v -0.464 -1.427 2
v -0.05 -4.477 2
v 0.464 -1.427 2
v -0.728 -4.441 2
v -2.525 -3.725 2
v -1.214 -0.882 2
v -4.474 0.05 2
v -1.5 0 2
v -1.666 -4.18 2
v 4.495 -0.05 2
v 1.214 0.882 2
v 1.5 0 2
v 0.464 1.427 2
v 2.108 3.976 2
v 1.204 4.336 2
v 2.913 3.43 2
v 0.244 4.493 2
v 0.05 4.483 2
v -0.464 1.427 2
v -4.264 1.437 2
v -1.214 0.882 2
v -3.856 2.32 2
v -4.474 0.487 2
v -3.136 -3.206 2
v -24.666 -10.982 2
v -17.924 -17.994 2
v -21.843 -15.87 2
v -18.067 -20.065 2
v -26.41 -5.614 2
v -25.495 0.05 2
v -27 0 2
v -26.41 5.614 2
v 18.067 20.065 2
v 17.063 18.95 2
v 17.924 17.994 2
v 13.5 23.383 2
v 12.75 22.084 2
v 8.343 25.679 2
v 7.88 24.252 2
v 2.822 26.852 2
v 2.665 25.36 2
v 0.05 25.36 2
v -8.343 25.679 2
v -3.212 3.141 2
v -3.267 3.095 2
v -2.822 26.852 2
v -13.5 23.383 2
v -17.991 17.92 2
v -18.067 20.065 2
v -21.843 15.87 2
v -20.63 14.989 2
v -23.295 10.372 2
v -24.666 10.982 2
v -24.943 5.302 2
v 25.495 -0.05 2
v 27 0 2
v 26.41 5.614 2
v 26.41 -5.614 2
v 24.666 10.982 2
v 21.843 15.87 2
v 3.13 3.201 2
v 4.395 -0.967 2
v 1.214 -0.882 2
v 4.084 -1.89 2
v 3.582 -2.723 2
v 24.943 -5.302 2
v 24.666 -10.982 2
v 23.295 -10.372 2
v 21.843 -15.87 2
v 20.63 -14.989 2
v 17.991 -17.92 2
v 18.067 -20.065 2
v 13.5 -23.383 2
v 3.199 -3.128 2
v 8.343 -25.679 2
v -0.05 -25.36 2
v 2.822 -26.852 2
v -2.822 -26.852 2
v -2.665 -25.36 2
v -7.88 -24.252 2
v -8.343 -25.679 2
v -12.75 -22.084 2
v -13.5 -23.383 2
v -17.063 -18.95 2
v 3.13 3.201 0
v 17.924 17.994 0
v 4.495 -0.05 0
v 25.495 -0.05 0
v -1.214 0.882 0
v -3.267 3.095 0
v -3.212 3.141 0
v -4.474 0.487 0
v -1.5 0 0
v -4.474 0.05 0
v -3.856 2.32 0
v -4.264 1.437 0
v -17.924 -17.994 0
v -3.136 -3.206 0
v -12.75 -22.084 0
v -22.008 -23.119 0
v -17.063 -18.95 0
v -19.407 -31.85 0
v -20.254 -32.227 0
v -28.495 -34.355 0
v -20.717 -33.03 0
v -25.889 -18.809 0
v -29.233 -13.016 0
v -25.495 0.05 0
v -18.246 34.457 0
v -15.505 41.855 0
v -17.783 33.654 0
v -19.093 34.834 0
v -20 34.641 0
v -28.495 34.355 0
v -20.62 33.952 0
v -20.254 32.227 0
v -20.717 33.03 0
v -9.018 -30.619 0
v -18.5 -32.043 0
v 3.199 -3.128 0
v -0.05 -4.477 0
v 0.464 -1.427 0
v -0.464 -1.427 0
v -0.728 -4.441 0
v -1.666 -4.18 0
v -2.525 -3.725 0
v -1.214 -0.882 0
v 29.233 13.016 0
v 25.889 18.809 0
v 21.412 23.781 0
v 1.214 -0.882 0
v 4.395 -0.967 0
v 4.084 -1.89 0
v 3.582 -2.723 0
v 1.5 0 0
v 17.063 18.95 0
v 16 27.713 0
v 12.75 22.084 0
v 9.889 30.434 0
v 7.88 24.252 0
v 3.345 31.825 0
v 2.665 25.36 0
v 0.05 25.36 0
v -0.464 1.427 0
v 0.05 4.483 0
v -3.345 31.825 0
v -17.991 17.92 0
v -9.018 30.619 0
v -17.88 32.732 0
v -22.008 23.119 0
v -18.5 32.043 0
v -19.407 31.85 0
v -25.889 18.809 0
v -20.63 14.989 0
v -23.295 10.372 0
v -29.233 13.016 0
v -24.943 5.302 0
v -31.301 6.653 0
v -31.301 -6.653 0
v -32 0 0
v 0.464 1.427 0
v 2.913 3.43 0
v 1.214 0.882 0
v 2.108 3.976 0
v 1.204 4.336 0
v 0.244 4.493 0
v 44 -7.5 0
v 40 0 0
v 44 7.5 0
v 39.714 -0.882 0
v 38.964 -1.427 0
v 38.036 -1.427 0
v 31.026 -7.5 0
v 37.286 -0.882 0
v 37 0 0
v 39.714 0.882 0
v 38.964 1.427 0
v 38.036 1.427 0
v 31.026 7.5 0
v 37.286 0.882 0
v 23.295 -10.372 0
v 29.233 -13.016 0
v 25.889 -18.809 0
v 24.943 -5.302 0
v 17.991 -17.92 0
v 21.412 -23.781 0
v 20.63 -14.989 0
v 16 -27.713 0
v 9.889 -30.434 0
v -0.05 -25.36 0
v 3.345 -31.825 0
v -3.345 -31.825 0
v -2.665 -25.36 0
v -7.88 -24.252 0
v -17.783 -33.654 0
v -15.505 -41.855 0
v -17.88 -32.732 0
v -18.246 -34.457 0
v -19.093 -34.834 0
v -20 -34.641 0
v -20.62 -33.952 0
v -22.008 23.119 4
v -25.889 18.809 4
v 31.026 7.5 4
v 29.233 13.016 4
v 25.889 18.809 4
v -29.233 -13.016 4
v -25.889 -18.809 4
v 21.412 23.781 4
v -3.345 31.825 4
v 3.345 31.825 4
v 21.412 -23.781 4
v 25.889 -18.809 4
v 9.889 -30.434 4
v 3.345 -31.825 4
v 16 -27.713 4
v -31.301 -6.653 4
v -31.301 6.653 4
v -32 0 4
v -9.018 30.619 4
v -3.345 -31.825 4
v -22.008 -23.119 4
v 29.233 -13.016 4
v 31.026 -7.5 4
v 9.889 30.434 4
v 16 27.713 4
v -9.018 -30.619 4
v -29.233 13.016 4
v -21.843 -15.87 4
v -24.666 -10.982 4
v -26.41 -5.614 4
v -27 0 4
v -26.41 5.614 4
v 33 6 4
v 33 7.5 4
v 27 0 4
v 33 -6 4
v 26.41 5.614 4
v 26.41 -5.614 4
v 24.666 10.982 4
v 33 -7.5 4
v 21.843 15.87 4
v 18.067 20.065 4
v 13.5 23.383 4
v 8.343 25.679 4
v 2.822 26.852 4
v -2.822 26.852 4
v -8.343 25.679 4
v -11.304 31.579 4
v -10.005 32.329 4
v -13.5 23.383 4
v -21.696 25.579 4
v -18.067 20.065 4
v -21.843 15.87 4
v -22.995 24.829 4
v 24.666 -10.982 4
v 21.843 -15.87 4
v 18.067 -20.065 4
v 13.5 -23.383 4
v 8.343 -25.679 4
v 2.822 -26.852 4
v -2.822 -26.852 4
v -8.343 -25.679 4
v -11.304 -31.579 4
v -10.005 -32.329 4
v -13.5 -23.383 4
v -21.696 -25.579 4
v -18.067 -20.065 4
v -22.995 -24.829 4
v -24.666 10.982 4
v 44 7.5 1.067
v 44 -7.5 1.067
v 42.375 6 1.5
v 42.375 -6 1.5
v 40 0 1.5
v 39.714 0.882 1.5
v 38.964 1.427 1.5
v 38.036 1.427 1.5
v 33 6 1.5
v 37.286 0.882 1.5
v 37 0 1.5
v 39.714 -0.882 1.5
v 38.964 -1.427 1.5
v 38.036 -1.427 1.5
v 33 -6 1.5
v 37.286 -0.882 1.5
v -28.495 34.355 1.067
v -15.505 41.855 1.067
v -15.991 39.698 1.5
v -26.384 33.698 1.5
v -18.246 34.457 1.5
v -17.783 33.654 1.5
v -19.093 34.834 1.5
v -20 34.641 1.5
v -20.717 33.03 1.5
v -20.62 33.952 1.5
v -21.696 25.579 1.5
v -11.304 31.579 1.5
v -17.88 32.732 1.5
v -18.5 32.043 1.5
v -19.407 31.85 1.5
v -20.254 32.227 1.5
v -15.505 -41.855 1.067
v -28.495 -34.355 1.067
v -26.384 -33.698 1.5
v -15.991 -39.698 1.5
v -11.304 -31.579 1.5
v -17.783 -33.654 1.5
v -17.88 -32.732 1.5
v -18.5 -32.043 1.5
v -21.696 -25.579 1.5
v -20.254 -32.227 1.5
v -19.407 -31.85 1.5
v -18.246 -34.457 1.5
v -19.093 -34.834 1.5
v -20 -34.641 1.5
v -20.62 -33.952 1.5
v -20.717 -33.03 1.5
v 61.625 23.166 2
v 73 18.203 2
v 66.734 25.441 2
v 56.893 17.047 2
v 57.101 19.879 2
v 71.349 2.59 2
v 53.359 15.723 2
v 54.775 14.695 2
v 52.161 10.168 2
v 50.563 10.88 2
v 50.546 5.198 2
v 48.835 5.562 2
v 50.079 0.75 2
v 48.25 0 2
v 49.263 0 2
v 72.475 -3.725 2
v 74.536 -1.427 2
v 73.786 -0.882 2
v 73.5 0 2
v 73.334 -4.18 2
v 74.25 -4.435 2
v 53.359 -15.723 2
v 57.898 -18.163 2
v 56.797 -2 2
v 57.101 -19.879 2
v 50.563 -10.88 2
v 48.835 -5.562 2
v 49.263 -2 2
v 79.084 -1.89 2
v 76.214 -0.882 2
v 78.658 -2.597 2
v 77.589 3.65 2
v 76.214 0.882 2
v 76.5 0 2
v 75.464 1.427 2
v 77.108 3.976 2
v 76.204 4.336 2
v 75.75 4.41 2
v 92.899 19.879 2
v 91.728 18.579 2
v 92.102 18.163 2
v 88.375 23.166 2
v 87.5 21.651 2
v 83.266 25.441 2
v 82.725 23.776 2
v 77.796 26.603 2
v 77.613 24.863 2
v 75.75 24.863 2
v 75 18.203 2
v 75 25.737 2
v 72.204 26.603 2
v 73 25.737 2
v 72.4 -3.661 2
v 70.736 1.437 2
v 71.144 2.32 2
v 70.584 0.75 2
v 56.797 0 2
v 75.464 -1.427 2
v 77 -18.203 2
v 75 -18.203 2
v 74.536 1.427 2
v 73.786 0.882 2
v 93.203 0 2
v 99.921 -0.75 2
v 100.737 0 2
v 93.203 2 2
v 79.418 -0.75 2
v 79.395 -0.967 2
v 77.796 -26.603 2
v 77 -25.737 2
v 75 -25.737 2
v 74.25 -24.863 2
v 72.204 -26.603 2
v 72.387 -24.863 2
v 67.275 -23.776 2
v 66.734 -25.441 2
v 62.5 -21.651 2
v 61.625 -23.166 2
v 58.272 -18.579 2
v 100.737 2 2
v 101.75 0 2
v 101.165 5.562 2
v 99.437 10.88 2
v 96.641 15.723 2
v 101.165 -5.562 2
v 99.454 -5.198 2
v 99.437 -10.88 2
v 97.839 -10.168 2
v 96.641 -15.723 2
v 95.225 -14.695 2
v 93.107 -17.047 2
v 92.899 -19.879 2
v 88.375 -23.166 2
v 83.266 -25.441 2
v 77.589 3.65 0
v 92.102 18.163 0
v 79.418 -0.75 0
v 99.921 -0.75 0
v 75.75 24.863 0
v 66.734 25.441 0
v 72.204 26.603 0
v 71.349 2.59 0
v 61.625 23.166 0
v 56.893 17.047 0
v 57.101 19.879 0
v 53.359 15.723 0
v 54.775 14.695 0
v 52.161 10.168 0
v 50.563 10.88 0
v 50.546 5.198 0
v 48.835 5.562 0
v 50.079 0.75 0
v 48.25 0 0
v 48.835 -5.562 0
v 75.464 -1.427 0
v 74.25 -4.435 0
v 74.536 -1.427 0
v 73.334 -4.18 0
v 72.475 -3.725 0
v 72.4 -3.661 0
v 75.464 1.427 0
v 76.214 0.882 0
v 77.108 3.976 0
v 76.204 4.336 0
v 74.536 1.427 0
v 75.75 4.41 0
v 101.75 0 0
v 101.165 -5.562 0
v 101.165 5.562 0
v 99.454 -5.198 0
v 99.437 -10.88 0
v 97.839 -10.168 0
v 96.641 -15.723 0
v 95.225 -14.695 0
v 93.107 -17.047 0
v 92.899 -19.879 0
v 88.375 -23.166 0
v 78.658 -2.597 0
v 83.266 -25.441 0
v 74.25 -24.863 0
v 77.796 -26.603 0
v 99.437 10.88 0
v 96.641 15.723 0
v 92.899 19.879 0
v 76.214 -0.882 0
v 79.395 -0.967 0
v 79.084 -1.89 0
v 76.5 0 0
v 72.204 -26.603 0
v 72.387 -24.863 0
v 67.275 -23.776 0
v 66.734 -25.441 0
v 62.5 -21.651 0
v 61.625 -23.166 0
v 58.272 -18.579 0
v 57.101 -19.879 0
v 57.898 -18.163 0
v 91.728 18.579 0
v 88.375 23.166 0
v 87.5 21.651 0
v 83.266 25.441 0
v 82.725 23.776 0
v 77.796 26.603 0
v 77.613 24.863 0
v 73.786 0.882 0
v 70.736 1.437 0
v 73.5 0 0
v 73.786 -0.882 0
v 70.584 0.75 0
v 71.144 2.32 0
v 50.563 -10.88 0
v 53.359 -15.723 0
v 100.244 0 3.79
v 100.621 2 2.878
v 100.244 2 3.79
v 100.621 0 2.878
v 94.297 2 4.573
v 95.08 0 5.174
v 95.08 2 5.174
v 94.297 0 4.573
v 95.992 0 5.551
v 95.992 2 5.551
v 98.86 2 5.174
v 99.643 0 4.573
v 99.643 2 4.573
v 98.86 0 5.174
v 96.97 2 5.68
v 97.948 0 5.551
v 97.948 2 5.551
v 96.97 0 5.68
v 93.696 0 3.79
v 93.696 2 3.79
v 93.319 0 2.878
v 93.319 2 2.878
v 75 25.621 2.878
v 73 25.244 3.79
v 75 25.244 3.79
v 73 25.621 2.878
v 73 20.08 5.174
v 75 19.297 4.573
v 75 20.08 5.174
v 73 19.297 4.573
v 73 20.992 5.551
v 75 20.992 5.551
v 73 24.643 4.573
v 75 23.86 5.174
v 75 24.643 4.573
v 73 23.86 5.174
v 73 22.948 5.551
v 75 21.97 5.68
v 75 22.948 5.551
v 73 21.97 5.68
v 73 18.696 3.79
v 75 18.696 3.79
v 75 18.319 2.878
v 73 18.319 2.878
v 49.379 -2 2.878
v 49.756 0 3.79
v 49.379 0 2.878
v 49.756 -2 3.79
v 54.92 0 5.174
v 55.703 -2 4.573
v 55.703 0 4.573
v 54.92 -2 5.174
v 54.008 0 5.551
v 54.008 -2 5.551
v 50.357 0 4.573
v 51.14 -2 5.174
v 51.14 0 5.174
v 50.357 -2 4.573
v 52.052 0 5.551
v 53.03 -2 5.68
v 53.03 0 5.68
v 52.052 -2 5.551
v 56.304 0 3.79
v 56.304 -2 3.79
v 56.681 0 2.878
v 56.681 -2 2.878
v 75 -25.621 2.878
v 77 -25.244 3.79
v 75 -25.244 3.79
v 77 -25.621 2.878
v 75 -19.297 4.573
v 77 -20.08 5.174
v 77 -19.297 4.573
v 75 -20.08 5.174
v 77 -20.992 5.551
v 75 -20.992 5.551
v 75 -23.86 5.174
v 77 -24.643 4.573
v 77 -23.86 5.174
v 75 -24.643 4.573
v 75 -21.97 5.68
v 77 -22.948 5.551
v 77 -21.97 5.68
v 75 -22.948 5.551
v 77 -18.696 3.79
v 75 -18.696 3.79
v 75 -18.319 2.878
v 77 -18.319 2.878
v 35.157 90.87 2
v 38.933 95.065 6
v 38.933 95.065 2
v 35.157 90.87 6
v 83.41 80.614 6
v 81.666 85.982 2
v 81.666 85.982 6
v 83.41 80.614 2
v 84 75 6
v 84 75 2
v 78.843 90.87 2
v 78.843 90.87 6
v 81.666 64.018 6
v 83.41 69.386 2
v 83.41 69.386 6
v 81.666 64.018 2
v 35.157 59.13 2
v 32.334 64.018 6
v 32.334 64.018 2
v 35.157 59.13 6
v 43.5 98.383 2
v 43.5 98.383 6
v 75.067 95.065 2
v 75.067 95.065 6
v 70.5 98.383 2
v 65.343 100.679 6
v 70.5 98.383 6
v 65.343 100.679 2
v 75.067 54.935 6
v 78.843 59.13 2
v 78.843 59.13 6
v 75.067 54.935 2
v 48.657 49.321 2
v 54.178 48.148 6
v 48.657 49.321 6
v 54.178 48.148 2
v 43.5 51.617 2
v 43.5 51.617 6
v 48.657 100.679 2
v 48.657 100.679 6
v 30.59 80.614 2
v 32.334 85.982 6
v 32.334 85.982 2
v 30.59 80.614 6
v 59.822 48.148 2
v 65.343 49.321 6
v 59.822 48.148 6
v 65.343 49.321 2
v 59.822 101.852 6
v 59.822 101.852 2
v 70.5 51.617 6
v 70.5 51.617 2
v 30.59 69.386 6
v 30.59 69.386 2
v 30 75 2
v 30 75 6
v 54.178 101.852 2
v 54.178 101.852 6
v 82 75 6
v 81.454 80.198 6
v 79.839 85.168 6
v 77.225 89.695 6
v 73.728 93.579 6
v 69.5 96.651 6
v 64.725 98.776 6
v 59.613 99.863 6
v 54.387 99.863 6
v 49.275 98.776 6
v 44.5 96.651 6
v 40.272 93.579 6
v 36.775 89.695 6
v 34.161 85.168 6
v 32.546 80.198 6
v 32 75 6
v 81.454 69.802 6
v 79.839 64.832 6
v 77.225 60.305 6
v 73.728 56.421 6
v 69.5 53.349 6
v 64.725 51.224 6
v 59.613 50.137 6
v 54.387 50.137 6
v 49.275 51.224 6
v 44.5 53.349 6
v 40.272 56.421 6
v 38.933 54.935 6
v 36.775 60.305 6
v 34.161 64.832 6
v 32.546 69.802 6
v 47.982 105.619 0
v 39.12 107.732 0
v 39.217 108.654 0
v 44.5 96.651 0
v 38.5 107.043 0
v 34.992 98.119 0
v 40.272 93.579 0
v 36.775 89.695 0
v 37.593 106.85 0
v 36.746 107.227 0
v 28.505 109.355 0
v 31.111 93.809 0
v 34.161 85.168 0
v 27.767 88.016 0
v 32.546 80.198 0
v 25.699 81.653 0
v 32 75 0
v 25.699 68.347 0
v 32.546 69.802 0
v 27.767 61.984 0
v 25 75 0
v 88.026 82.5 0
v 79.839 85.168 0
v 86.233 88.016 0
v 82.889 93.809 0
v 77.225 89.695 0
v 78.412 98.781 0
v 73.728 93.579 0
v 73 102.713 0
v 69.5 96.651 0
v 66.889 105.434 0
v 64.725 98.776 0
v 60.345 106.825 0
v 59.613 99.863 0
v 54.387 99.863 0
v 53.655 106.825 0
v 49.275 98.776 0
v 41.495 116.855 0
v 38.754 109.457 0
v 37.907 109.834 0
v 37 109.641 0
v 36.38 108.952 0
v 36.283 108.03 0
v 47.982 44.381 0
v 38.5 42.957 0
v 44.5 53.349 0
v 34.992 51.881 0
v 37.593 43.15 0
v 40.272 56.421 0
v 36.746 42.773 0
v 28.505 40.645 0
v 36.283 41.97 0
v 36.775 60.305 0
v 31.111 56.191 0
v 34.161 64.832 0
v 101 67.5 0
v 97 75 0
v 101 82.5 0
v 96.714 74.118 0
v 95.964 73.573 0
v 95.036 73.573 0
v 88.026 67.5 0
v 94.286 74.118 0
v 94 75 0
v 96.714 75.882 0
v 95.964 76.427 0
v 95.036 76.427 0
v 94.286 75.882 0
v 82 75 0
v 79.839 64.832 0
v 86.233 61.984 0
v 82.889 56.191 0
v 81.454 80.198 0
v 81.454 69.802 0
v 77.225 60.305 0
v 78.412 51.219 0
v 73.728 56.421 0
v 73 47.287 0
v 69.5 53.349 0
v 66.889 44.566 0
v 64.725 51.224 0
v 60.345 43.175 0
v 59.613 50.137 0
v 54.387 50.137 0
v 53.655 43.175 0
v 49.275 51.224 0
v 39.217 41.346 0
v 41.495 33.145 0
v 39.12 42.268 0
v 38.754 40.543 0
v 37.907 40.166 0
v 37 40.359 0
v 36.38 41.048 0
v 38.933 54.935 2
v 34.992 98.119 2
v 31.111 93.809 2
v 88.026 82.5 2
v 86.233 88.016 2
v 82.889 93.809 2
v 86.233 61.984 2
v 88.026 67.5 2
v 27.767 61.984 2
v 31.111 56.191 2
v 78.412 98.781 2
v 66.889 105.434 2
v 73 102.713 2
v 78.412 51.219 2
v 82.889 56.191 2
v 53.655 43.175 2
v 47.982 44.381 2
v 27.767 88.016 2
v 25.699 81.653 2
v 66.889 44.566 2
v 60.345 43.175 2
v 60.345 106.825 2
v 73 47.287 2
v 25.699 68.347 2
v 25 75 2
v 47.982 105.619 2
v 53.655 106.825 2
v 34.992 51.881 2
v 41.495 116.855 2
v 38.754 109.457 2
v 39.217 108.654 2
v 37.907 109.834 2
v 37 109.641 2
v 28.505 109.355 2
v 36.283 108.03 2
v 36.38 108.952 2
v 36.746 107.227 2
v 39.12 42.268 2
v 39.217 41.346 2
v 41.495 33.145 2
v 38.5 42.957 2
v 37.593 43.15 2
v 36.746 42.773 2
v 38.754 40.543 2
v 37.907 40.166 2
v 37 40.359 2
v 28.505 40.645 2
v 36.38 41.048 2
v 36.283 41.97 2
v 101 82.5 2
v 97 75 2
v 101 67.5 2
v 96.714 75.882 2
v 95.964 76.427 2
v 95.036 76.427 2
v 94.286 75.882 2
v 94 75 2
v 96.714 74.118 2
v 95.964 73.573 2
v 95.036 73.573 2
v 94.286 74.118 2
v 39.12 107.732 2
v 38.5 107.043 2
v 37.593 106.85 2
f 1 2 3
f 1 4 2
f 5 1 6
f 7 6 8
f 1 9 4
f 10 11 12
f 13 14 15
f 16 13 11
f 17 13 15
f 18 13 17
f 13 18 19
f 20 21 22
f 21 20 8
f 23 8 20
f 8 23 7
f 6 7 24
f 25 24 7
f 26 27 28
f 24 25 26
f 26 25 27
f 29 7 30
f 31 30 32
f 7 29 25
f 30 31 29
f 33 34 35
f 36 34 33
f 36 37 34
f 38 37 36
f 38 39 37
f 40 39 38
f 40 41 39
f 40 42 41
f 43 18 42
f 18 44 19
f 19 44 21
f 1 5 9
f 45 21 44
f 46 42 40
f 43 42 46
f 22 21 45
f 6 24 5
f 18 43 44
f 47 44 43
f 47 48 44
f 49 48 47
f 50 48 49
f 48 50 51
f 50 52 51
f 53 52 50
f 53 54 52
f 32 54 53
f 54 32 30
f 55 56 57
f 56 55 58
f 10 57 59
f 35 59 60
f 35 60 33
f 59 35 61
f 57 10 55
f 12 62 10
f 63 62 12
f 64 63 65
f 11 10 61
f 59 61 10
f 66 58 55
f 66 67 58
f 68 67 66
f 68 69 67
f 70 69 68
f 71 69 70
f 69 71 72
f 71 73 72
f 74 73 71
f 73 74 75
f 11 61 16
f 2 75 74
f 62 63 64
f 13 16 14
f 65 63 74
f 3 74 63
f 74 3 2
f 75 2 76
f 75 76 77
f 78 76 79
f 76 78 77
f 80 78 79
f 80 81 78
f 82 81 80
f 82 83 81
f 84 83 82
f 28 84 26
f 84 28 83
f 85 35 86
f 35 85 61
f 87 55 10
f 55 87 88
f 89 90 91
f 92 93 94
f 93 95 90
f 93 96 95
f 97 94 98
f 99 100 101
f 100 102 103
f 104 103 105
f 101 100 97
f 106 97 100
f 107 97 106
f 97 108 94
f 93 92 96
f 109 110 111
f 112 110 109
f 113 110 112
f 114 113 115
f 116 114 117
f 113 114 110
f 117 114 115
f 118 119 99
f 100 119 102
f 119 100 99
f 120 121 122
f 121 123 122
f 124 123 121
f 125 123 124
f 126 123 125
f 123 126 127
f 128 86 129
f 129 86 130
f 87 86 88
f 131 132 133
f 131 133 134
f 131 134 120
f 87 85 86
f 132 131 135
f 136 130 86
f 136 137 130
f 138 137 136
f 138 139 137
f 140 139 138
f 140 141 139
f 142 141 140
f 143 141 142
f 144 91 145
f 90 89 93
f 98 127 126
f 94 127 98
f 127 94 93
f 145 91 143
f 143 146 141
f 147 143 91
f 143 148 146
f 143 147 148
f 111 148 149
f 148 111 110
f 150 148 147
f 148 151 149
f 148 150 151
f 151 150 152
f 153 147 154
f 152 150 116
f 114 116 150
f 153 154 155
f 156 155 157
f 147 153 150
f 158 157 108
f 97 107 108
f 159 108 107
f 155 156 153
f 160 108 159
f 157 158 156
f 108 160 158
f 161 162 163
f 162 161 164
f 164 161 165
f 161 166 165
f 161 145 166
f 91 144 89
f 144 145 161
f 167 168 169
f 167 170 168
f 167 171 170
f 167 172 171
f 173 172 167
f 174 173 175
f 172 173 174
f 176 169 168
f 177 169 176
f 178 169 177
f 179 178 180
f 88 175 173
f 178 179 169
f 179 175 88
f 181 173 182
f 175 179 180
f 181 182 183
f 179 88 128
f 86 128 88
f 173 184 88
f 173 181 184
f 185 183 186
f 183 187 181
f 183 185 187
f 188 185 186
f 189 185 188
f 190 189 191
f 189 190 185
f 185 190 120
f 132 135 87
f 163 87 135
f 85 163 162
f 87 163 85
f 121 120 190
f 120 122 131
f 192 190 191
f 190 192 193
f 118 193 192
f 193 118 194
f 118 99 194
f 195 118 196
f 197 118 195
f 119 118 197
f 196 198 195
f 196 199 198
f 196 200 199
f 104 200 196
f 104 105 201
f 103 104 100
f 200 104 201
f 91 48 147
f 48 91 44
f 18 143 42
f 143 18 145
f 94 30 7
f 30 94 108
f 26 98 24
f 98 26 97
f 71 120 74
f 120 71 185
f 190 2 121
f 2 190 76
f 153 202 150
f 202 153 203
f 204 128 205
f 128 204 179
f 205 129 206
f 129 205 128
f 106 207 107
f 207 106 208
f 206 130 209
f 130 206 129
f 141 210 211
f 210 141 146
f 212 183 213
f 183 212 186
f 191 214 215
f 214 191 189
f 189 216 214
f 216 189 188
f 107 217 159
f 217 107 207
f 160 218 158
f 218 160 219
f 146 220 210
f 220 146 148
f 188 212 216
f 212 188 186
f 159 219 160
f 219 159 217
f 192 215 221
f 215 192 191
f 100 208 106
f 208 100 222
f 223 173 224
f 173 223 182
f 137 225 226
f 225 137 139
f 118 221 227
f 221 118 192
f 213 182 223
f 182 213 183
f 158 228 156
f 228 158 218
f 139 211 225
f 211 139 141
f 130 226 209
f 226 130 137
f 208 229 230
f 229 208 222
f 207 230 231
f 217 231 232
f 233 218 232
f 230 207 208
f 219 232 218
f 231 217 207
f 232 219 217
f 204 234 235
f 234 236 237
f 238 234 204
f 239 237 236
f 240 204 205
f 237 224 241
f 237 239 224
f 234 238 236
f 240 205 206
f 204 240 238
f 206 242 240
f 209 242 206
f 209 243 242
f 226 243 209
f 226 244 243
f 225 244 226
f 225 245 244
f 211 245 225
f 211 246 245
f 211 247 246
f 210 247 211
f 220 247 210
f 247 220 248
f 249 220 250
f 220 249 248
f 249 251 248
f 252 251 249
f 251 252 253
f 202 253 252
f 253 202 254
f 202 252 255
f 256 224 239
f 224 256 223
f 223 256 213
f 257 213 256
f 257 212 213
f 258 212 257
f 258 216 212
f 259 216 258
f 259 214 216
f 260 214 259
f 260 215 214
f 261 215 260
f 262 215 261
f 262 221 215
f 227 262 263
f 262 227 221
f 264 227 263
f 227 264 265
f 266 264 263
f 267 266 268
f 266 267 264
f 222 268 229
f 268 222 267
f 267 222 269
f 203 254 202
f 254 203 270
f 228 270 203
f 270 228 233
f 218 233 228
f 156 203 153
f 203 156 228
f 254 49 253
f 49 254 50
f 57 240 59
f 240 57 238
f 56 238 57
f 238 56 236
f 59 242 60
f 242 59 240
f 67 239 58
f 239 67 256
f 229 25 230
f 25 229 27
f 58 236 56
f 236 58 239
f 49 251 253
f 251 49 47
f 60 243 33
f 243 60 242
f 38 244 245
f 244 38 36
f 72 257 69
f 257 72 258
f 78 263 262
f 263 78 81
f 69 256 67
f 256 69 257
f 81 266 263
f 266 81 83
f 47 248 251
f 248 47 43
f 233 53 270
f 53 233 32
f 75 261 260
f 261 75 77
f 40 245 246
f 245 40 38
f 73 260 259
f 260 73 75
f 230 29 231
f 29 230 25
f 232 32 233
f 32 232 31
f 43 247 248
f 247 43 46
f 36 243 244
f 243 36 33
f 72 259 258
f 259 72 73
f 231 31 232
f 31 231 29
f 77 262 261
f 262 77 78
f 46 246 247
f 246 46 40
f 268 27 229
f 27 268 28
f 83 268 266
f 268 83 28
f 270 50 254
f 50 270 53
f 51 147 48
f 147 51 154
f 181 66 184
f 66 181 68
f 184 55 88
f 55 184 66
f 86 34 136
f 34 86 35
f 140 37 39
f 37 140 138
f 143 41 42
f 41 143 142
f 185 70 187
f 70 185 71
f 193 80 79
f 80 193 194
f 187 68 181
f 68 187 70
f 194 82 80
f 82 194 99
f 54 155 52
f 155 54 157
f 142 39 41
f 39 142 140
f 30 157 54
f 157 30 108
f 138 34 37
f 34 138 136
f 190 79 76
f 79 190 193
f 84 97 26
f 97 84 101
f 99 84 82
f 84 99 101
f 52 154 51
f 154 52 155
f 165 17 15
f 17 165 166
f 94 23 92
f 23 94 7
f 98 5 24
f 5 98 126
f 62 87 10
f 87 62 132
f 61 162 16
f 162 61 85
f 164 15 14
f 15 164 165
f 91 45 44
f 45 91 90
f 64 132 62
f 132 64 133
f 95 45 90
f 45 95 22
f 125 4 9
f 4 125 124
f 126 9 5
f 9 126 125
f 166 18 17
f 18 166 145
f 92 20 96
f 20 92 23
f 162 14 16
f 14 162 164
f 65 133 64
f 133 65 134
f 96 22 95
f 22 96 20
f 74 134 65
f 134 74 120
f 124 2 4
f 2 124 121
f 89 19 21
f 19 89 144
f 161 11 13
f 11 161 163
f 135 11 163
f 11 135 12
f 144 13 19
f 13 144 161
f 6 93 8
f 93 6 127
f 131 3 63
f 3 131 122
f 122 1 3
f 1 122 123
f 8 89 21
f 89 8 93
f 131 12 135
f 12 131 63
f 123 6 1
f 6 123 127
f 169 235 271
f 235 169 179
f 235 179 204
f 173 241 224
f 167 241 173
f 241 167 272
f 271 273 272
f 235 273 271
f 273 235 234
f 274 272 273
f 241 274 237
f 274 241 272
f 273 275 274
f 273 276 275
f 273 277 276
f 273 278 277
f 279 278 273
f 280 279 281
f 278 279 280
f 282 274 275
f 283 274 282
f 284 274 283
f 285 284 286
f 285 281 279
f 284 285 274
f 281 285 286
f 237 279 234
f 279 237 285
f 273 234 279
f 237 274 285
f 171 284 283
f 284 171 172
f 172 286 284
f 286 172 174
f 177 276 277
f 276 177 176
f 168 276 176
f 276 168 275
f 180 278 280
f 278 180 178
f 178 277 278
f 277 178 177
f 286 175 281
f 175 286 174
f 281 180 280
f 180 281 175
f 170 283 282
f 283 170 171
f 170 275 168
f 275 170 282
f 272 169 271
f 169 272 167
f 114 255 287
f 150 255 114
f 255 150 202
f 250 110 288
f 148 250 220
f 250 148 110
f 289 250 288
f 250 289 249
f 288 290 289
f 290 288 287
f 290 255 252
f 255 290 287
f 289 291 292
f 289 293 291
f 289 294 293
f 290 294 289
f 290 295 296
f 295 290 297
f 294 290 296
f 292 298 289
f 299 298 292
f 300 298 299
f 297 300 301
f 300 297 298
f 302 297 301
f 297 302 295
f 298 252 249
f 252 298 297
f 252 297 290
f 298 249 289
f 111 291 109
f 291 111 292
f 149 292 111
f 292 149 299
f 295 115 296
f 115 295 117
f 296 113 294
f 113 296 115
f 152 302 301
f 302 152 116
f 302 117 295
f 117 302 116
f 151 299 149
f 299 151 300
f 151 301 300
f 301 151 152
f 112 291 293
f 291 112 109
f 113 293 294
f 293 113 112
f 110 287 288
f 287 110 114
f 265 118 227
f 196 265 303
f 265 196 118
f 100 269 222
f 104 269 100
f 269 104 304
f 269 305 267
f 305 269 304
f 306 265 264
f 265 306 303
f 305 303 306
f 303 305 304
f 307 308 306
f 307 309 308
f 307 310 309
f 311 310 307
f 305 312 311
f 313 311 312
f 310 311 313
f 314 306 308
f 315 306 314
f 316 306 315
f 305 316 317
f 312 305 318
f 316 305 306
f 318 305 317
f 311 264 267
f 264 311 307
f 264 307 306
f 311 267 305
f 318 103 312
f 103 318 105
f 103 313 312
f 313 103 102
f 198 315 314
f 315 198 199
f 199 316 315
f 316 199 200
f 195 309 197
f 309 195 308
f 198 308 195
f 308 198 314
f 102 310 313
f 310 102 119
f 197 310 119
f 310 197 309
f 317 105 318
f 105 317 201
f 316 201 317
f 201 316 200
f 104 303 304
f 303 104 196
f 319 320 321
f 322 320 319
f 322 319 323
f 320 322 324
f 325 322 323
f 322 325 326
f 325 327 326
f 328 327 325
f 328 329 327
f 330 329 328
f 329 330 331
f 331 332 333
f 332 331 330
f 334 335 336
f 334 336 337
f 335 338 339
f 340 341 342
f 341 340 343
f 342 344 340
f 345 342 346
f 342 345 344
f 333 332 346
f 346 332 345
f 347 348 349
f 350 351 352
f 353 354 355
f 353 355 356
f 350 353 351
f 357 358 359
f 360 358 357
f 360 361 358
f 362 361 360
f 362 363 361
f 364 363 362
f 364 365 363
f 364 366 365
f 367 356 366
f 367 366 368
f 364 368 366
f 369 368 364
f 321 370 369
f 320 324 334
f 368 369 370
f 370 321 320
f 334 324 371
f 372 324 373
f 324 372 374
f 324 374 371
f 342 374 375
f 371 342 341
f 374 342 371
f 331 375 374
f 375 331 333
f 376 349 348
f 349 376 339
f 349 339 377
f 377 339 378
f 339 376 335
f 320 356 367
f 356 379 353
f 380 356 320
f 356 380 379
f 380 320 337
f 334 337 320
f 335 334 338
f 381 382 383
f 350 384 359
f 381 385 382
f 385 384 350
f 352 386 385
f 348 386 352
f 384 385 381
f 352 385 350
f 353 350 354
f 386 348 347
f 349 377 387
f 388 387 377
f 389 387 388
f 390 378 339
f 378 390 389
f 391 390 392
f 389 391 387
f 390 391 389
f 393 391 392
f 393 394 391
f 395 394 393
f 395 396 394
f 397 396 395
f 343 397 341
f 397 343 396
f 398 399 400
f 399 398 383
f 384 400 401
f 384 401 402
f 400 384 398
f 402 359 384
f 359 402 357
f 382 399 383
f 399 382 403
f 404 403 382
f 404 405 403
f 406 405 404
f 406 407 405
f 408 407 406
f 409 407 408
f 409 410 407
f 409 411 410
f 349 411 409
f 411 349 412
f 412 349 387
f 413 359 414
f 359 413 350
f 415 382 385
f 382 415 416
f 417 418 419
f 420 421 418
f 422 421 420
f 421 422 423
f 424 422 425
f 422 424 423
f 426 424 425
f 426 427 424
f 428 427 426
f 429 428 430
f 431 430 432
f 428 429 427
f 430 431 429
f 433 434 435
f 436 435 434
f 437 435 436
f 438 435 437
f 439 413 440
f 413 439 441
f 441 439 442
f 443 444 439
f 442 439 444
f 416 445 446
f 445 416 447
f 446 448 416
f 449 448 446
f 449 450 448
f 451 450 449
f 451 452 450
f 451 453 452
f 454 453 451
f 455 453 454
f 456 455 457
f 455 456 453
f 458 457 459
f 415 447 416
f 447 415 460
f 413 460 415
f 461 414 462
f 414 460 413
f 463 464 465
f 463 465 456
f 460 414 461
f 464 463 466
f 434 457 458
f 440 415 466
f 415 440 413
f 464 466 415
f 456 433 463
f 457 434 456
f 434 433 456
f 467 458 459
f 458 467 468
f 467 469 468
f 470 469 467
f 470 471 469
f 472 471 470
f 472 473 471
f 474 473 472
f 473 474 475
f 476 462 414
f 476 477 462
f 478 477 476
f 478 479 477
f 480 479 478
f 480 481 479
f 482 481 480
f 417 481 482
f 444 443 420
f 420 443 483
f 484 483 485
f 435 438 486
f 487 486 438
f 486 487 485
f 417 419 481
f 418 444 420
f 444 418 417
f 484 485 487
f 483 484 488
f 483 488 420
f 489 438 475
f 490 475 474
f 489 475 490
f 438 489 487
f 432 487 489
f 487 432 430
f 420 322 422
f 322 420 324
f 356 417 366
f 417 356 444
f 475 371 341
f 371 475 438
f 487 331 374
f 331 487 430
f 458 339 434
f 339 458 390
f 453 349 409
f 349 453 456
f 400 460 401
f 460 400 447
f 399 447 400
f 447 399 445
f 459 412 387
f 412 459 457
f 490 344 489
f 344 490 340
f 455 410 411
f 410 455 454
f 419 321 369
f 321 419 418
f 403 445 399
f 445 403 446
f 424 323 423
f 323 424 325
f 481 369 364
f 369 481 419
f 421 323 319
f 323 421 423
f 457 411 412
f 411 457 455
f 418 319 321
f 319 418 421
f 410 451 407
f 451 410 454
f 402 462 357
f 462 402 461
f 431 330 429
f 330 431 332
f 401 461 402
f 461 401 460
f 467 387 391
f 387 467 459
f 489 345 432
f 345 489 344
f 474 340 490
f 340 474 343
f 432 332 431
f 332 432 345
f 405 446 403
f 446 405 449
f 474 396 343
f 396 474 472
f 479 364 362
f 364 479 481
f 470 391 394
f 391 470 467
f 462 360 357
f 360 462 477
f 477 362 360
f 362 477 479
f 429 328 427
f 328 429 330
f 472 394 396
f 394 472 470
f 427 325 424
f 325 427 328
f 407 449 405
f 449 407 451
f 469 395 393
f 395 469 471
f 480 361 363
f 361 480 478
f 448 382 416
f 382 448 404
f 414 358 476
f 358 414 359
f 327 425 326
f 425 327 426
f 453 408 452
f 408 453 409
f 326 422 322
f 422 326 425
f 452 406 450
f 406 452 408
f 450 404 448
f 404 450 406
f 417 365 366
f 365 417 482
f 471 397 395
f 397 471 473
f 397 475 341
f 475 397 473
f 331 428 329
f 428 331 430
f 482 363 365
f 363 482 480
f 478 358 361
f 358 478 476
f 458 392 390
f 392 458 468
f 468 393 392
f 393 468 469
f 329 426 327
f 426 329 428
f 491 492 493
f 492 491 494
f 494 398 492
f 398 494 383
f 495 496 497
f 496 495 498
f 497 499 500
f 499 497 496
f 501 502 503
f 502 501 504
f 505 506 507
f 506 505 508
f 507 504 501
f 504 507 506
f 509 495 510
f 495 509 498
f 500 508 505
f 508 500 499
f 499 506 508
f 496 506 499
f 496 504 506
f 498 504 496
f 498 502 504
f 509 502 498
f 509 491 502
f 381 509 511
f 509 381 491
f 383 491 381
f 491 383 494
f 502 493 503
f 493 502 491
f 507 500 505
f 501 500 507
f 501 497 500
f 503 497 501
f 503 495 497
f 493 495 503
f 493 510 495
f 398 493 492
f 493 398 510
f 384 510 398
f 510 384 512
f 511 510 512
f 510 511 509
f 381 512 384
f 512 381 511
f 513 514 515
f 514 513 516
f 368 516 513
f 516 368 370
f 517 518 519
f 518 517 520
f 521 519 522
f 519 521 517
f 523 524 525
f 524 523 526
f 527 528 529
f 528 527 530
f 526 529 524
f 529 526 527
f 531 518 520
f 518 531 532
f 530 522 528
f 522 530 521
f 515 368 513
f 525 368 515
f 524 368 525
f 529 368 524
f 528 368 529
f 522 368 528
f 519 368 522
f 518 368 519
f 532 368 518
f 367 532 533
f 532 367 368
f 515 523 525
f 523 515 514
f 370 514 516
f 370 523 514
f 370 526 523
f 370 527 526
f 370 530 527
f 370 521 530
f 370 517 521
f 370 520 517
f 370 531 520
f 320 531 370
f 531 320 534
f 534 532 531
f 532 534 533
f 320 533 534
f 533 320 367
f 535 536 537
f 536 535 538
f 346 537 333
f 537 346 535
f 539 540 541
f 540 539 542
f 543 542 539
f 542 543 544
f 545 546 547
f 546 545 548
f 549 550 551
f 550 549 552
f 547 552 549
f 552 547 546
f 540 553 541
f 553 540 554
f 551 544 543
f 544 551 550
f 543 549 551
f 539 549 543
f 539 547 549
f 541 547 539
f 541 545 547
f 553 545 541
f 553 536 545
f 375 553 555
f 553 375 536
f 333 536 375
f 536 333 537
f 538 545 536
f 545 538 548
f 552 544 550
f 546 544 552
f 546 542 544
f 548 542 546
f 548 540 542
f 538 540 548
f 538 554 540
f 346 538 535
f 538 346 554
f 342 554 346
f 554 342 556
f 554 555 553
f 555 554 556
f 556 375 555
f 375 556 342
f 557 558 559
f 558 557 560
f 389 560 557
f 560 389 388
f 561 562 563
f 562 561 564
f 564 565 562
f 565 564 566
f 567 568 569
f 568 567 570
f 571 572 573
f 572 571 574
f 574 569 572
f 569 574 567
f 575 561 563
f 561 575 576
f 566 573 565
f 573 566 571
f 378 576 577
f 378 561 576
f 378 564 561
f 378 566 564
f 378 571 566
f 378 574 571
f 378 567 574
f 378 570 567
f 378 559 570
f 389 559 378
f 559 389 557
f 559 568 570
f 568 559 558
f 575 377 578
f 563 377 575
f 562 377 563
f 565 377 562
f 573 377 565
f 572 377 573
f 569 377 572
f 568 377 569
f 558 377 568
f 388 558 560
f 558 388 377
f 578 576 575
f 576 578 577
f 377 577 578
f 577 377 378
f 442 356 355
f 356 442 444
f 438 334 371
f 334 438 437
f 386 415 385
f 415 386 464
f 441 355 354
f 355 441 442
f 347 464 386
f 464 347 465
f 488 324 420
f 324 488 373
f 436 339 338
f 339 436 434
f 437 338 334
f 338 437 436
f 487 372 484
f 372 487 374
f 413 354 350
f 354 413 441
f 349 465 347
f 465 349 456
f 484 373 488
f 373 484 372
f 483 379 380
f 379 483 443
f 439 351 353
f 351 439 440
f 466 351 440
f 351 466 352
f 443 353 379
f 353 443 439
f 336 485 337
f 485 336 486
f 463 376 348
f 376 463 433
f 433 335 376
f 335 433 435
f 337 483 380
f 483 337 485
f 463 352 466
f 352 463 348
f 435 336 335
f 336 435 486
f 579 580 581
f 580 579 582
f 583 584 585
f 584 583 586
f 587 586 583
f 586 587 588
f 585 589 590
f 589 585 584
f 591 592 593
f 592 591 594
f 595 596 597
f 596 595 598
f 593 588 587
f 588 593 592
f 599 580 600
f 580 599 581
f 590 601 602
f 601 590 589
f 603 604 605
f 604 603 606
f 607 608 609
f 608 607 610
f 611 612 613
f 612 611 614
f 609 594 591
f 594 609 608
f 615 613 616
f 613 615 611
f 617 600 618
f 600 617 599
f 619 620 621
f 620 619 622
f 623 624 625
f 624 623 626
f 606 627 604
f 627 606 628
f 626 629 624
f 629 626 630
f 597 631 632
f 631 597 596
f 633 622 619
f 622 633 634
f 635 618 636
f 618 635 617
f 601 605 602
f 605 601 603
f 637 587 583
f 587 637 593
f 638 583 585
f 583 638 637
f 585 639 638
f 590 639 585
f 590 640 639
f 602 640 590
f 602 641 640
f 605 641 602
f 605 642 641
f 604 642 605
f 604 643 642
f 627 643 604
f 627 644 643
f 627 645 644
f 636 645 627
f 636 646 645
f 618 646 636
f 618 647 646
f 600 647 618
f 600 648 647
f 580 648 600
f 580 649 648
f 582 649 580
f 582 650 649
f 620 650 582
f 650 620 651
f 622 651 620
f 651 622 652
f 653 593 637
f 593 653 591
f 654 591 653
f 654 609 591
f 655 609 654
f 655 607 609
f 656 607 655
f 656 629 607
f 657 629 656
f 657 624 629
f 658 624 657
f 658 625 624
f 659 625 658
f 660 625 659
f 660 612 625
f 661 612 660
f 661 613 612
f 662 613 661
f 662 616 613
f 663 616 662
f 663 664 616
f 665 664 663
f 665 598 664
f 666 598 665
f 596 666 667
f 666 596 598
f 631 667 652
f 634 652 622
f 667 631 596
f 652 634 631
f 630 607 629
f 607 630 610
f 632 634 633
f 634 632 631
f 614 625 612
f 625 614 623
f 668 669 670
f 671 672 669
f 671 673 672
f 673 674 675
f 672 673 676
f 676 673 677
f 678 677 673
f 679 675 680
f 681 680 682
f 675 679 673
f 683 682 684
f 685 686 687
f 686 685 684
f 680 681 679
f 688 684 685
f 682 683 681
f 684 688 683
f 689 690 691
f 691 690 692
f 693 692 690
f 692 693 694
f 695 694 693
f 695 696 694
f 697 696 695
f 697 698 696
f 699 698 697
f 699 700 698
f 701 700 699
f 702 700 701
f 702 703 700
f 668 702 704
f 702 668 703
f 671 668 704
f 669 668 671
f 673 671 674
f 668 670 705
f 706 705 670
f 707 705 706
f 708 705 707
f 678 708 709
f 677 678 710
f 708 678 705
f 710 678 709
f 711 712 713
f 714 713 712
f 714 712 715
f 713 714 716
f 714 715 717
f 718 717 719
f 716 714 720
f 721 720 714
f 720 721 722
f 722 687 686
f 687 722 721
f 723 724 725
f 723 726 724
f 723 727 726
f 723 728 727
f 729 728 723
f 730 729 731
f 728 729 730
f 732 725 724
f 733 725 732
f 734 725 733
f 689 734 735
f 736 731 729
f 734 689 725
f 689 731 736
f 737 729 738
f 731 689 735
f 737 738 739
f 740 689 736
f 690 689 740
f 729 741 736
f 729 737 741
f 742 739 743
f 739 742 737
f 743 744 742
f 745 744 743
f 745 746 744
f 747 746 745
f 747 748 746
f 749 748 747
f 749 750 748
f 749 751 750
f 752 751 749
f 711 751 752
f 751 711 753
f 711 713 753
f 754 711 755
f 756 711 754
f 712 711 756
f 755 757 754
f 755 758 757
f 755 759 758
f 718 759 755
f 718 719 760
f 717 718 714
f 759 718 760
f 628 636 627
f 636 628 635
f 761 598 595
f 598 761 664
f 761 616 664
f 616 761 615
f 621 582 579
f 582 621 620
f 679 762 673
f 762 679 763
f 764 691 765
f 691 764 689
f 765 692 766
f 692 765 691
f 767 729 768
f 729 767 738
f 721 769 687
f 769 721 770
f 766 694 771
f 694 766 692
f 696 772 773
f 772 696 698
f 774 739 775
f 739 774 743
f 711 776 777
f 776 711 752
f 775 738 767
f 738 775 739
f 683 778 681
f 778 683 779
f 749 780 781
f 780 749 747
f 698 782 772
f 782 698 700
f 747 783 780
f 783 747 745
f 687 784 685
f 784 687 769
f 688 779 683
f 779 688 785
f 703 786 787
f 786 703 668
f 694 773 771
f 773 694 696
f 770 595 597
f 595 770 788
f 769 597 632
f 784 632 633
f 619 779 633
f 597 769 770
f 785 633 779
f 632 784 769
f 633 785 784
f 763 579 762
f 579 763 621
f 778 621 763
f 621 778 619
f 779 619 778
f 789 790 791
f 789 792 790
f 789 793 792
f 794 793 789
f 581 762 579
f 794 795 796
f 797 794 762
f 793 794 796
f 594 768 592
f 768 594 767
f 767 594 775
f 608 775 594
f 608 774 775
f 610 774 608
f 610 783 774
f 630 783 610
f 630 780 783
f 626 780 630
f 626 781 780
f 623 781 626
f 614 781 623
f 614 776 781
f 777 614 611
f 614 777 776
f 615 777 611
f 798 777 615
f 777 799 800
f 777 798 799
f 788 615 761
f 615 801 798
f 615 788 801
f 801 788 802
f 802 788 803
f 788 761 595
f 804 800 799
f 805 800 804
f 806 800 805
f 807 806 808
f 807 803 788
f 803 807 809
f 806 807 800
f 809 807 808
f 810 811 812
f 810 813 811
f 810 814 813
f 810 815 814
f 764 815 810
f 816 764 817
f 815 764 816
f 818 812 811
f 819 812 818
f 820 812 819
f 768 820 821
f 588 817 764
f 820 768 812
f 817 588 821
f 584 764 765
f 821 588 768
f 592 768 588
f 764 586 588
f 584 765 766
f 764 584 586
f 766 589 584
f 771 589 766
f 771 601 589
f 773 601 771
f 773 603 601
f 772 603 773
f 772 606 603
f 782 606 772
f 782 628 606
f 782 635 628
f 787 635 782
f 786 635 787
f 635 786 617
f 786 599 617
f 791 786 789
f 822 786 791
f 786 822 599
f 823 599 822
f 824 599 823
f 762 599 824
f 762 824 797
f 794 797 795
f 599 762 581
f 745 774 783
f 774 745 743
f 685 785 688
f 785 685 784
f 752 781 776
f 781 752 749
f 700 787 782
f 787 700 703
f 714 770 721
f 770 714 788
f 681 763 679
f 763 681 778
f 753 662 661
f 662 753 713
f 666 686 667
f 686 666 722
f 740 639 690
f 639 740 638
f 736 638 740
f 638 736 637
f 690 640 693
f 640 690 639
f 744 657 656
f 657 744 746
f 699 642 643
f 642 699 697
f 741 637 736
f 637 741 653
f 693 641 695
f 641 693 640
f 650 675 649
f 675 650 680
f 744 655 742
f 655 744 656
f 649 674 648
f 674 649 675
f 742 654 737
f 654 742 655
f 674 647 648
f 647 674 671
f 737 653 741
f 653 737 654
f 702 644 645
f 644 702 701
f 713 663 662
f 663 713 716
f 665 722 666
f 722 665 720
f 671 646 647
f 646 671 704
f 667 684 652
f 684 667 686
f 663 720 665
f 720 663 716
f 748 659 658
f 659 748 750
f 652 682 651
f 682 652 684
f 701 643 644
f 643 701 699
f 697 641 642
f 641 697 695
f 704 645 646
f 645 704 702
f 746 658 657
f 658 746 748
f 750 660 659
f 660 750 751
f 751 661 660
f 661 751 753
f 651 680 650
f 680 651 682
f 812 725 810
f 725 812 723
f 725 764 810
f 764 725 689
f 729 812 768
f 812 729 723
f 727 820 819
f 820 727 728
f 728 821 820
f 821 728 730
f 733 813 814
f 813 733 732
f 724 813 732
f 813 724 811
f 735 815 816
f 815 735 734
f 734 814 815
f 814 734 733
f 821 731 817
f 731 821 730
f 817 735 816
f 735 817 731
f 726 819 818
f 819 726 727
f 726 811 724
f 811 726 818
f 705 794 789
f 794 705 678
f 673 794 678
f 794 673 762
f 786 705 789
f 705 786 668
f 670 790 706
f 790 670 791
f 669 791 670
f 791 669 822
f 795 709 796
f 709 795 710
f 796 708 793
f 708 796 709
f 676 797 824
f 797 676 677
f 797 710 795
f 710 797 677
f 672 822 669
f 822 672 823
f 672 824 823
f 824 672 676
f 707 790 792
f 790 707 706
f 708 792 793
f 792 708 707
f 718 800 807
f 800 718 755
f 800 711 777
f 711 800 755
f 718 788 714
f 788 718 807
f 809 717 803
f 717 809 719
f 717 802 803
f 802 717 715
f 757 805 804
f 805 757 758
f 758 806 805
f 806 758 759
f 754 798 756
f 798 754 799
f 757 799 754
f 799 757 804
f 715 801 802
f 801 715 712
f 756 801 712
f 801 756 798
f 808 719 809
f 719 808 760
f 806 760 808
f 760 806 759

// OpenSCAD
// Ilmion
// 2013-05

// preview[view:south, tilt:top]

/* [Parameters] */
// Which one would you like to see?
part = "all"; // [first:Vent hole,second:vent door,third:inside part, both:Vent hole and door, all:all]
// Diameter (in mm) of the hole to be ventillated (default : 54 mm = 2 1/8 inches)
Hole_Diameter = 54; // [2.0:170.0]
// Thickness (in mm) total of the vent door and holed part (default : 4 mm)
Thickness = 4; // [1.0:20.0]
// Number of hole in the vent (default : 4)
Number_of_Ventilation_hole = 4; // [2:6]
// How much wider (in mm) are the door compare to the hole they hide (default : 1.5 mm)
Plus_Width_of_door = 1.5; // [1.00:5.00]
// Tolerance (in mm) for better fitting of the door in the vent (default : 0.25)
Tolerance = 0.25; // [0.00:1.00]
// Thickness (in mm) of the wall to be ventillated. Set the height of the inside part.
Enclosure_Thickness = 4; // [1:20]
// Diameter (in mm) of the hole used for connecting the door with the holed part (default : 3 for 3mm filament)
Joint_Diameter = 3; // [0: 10]

/* [Screws] */

// Number of screw fixation (default : 3)
Number_of_fixation = 3; // [2:6]
// Diameter (in mm) of the screw to be use to fix the vent (default : 3mm)
Screw_diameter = 3;

/* [Hidden] */

gAngle = 360/(Number_of_Ventilation_hole*2);
gCenterDiam = max(0.20 * (Hole_Diameter/2), 9);
gScrewSectionLength = Screw_diameter*5;
gScrewSectionWidth = Screw_diameter*5;
$fs=1;

print_part();

module print_part() {
	if (part == "first") {
		VentHole();
	} else if (part == "second") {
		VentDoor();
	} else if (part == "both") {
		VentHole();
		translate([Hole_Diameter+16,0,0]) VentDoor();
	} else if (part == "third") {
		InsideConnector();
	} else if (part == "all") {
		VentHole();
		translate([Hole_Diameter+gScrewSectionLength+6,0,0]) VentDoor();
		translate([Hole_Diameter/3*2+gScrewSectionLength+6, Hole_Diameter+gScrewSectionLength+6,0]) InsideConnector();
	} else {
		VentHole();
		translate([Hole_Diameter+gScrewSectionLength+6,0,0]) VentDoor();
		translate([Hole_Diameter/3*2+gScrewSectionLength+6, Hole_Diameter+gScrewSectionLength+6,0]) InsideConnector();
	}
}

module ScrewSection()
{
	difference()
	{
		union()
		{
			cube([4,gScrewSectionWidth,Thickness]);
			translate([4,gScrewSectionWidth,0]) rotate([90,0,0]) linear_extrude(height = gScrewSectionWidth) polygon([[0,0], [0, Thickness], [gScrewSectionLength,0]]);
		}
		translate([4, 1.5, 1.5]) cube([gScrewSectionLength+10, gScrewSectionWidth-3, Thickness+5]);
		translate([gScrewSectionLength*0.5+2,gScrewSectionWidth/2,-1]) cylinder(h=10, r=Screw_diameter/2);
		translate([gScrewSectionLength,-1,-1]) cube([20,gScrewSectionWidth+2,20]);
	}
}

module FlatScrewSection()
{
	difference()
	{
		cube([gScrewSectionLength,gScrewSectionWidth,2]);
		translate([gScrewSectionLength*0.5+2, gScrewSectionWidth/2,-1]) cylinder(h=10, r=Screw_diameter/2);
	}
}

module Helice(pAngle, pDiam, pHeight, pWidth = 0.1)
{
	union()
	{
		for (i = [0:Number_of_Ventilation_hole-1])
		{
			hull()
			{
				rotate([0,0, (i * pAngle) + (i * (360 - (Number_of_Ventilation_hole*pAngle)) / Number_of_Ventilation_hole)]) 
				{
					translate([0, pWidth/-2,0]) cube([pDiam, pWidth, pHeight]);
					rotate([0,0, pAngle]) translate([0, pWidth/-2,0])cube([pDiam, pWidth, pHeight]);
				}
			}
		}
	}
}

module VentHole()
{
	union()
	{
	difference()
	{
		union()
		{
			difference()
			{
				Helice(gAngle, Hole_Diameter, Thickness/2);
				translate([0, 0, -1])
				{
					difference()
					{
						cylinder(h=Thickness+2, r=Hole_Diameter + 5);
						translate([0, 0, -1])
						{
							cylinder(h=Thickness+4, r=(Hole_Diameter / 2) + 5);
						}
					}
				}
			}
			cylinder(h=Thickness/2, r=gCenterDiam / 2);
			difference()
			{
				cylinder(h=Thickness, r=Hole_Diameter / 2 + 5);
				translate([0,0,-1]) cylinder(h=Thickness+2, r=Hole_Diameter / 2);
			}
			difference()
			{
				cylinder(h=Thickness/2, r=Hole_Diameter/2+1);
				translate([0,0,-1]) cylinder(h=Thickness/2+2, r=Hole_Diameter/2-1.5);
			}
		}
		if(Joint_Diameter > 0)
		{
			translate([0,0,-3]) cylinder(h=Thickness + 10, r=Joint_Diameter/2);
		}
	}
	for (j = [0:Number_of_fixation-1])
	{
		rotate([0,0,j*(360/Number_of_fixation)]) translate([Hole_Diameter/2+2, gScrewSectionWidth/-2,0]) ScrewSection();
	}
	}
}

module Pognee()
{
	rotate([90,0,0])
	difference()
	{
		cylinder(h=2, r=0.07*Hole_Diameter);
		translate([Hole_Diameter/2*-1,Hole_Diameter*-1,-1]) cube(Hole_Diameter,Hole_Diameter,4);
	}
}

module VentDoor()
{
	difference()
	{
		union()
		{
			difference()
			{
				Helice(gAngle, Hole_Diameter, Thickness/2, Plus_Width_of_door);
				
				translate([0,0,-1]) 
				{
					difference()
					{
						cylinder(h=Thickness/2+2, r=Hole_Diameter*2);
						translate([0,0,-1]) cylinder(h=Thickness/2+4, r=Hole_Diameter/2-Tolerance);
					}
				}
			}
			cylinder(h=Thickness/2, r=gCenterDiam/2);
			difference()
			{
			cylinder(h=Thickness/2, r=Hole_Diameter/2-Tolerance);
			translate([0,0,-1]) cylinder(Thickness/2+2, r=Hole_Diameter/2-2);
			}
			for (j = [0:Number_of_Ventilation_hole-1])
			{
				rotate([0,0,j*(360/Number_of_Ventilation_hole)]) translate([Hole_Diameter/2-0.07*Hole_Diameter-Tolerance-1,2,Thickness/2-0.1])
				{
					Pognee();
				}
			}
		}
		if(Joint_Diameter > 0)
		{
			translate([0,0,-3]) cylinder(h=Thickness + 10, r=Joint_Diameter/2);
		}
	}
}

module InsideConnector()
{
	difference()
	{
		union()
		{
			cylinder(h=Enclosure_Thickness+2, r=Hole_Diameter/2);
			cylinder(h=2, r=Hole_Diameter / 2 + 5);
		}
		translate([0,0,-1]) cylinder(h=Enclosure_Thickness+4, r=Hole_Diameter/2-2);
	}
	for (j = [0:Number_of_fixation-1])
	{
		rotate([0,0,j*(360/Number_of_fixation)]) translate([Hole_Diameter/2+2, gScrewSectionWidth/-2,0]) FlatScrewSection();
	}
}



